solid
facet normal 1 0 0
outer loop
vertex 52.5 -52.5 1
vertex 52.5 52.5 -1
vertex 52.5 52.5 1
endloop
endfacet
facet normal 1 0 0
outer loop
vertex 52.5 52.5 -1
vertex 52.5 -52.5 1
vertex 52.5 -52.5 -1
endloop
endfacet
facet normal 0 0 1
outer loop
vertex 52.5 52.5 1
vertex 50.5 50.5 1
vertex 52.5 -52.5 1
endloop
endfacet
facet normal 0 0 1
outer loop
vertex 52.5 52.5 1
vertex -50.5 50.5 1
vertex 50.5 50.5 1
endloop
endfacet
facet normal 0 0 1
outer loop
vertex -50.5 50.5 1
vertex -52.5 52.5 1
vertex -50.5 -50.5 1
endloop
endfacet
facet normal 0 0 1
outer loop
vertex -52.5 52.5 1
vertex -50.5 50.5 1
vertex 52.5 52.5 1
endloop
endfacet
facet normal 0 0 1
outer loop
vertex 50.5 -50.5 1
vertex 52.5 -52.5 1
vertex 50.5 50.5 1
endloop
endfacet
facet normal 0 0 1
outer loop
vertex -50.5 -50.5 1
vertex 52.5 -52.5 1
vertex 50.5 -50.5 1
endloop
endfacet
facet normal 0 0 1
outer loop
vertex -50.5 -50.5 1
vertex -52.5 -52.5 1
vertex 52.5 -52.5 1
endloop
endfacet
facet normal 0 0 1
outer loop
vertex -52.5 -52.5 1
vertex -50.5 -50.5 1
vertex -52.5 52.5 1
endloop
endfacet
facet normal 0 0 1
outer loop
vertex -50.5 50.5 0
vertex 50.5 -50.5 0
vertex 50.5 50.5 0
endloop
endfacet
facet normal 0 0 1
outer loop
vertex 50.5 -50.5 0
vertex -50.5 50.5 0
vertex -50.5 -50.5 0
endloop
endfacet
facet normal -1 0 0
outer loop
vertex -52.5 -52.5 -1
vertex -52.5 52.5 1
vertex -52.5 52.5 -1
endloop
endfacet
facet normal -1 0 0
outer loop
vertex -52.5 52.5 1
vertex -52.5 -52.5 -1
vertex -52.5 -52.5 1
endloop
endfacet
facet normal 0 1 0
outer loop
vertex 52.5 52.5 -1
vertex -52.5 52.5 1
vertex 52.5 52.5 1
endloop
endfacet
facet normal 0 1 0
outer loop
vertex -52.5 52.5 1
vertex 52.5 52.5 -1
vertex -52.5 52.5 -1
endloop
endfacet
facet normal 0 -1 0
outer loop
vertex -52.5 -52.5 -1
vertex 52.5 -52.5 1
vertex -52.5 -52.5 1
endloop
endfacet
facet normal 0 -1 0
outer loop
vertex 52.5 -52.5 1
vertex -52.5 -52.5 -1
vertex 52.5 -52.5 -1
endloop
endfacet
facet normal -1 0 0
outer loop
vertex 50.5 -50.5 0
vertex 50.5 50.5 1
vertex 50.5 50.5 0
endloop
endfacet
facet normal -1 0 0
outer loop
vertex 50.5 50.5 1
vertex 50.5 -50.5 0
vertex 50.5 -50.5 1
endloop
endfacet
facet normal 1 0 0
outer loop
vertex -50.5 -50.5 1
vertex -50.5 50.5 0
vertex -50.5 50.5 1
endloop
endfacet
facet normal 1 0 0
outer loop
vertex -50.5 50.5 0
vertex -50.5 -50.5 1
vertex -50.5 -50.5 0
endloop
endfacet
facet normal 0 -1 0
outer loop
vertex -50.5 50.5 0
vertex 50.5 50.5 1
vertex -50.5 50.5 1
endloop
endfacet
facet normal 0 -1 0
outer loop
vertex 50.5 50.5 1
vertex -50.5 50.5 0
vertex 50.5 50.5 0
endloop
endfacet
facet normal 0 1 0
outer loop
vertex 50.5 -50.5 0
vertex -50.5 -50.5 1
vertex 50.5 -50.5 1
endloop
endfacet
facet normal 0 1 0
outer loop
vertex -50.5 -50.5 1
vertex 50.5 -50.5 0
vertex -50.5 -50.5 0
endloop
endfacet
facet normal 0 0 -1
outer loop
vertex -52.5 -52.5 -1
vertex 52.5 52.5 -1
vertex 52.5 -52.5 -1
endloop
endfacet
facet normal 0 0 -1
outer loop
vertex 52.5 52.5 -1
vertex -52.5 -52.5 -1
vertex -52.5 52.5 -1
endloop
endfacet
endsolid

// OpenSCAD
size = 100;
ext = 5;
wall = 4;
height = 1;

module img(invert) {
	translate([-size/2,-size/2]) 
		linear_extrude(height, convexity= 4)
			resize([size,size]) 
				offset(r = 0.5) import("image.dxf");
}

module base(height = height) {
	union() {
		img();
		circle(r = 16, h = 1);
	}
}

module sqbase(height = height, ext = ext) {
	cube([size + ext, size + ext, 1], center = true);
}

module positive() {
	union() {
		img();
		translate([0,0,-height / 2]) sqbase();
		translate([0,0,height / 2]) difference() {
			cube([size + ext, size + ext, height] , center = true);
			cube([size + ext - wall, size + ext- wall, height*1.001], center = true);
		}
	}
}

module negative() {
	difference() {
		cube([size + ext, size + ext, height * 2], center = true);
		translate([0, 0, -height * 0]) img();
	}
}

positive();
